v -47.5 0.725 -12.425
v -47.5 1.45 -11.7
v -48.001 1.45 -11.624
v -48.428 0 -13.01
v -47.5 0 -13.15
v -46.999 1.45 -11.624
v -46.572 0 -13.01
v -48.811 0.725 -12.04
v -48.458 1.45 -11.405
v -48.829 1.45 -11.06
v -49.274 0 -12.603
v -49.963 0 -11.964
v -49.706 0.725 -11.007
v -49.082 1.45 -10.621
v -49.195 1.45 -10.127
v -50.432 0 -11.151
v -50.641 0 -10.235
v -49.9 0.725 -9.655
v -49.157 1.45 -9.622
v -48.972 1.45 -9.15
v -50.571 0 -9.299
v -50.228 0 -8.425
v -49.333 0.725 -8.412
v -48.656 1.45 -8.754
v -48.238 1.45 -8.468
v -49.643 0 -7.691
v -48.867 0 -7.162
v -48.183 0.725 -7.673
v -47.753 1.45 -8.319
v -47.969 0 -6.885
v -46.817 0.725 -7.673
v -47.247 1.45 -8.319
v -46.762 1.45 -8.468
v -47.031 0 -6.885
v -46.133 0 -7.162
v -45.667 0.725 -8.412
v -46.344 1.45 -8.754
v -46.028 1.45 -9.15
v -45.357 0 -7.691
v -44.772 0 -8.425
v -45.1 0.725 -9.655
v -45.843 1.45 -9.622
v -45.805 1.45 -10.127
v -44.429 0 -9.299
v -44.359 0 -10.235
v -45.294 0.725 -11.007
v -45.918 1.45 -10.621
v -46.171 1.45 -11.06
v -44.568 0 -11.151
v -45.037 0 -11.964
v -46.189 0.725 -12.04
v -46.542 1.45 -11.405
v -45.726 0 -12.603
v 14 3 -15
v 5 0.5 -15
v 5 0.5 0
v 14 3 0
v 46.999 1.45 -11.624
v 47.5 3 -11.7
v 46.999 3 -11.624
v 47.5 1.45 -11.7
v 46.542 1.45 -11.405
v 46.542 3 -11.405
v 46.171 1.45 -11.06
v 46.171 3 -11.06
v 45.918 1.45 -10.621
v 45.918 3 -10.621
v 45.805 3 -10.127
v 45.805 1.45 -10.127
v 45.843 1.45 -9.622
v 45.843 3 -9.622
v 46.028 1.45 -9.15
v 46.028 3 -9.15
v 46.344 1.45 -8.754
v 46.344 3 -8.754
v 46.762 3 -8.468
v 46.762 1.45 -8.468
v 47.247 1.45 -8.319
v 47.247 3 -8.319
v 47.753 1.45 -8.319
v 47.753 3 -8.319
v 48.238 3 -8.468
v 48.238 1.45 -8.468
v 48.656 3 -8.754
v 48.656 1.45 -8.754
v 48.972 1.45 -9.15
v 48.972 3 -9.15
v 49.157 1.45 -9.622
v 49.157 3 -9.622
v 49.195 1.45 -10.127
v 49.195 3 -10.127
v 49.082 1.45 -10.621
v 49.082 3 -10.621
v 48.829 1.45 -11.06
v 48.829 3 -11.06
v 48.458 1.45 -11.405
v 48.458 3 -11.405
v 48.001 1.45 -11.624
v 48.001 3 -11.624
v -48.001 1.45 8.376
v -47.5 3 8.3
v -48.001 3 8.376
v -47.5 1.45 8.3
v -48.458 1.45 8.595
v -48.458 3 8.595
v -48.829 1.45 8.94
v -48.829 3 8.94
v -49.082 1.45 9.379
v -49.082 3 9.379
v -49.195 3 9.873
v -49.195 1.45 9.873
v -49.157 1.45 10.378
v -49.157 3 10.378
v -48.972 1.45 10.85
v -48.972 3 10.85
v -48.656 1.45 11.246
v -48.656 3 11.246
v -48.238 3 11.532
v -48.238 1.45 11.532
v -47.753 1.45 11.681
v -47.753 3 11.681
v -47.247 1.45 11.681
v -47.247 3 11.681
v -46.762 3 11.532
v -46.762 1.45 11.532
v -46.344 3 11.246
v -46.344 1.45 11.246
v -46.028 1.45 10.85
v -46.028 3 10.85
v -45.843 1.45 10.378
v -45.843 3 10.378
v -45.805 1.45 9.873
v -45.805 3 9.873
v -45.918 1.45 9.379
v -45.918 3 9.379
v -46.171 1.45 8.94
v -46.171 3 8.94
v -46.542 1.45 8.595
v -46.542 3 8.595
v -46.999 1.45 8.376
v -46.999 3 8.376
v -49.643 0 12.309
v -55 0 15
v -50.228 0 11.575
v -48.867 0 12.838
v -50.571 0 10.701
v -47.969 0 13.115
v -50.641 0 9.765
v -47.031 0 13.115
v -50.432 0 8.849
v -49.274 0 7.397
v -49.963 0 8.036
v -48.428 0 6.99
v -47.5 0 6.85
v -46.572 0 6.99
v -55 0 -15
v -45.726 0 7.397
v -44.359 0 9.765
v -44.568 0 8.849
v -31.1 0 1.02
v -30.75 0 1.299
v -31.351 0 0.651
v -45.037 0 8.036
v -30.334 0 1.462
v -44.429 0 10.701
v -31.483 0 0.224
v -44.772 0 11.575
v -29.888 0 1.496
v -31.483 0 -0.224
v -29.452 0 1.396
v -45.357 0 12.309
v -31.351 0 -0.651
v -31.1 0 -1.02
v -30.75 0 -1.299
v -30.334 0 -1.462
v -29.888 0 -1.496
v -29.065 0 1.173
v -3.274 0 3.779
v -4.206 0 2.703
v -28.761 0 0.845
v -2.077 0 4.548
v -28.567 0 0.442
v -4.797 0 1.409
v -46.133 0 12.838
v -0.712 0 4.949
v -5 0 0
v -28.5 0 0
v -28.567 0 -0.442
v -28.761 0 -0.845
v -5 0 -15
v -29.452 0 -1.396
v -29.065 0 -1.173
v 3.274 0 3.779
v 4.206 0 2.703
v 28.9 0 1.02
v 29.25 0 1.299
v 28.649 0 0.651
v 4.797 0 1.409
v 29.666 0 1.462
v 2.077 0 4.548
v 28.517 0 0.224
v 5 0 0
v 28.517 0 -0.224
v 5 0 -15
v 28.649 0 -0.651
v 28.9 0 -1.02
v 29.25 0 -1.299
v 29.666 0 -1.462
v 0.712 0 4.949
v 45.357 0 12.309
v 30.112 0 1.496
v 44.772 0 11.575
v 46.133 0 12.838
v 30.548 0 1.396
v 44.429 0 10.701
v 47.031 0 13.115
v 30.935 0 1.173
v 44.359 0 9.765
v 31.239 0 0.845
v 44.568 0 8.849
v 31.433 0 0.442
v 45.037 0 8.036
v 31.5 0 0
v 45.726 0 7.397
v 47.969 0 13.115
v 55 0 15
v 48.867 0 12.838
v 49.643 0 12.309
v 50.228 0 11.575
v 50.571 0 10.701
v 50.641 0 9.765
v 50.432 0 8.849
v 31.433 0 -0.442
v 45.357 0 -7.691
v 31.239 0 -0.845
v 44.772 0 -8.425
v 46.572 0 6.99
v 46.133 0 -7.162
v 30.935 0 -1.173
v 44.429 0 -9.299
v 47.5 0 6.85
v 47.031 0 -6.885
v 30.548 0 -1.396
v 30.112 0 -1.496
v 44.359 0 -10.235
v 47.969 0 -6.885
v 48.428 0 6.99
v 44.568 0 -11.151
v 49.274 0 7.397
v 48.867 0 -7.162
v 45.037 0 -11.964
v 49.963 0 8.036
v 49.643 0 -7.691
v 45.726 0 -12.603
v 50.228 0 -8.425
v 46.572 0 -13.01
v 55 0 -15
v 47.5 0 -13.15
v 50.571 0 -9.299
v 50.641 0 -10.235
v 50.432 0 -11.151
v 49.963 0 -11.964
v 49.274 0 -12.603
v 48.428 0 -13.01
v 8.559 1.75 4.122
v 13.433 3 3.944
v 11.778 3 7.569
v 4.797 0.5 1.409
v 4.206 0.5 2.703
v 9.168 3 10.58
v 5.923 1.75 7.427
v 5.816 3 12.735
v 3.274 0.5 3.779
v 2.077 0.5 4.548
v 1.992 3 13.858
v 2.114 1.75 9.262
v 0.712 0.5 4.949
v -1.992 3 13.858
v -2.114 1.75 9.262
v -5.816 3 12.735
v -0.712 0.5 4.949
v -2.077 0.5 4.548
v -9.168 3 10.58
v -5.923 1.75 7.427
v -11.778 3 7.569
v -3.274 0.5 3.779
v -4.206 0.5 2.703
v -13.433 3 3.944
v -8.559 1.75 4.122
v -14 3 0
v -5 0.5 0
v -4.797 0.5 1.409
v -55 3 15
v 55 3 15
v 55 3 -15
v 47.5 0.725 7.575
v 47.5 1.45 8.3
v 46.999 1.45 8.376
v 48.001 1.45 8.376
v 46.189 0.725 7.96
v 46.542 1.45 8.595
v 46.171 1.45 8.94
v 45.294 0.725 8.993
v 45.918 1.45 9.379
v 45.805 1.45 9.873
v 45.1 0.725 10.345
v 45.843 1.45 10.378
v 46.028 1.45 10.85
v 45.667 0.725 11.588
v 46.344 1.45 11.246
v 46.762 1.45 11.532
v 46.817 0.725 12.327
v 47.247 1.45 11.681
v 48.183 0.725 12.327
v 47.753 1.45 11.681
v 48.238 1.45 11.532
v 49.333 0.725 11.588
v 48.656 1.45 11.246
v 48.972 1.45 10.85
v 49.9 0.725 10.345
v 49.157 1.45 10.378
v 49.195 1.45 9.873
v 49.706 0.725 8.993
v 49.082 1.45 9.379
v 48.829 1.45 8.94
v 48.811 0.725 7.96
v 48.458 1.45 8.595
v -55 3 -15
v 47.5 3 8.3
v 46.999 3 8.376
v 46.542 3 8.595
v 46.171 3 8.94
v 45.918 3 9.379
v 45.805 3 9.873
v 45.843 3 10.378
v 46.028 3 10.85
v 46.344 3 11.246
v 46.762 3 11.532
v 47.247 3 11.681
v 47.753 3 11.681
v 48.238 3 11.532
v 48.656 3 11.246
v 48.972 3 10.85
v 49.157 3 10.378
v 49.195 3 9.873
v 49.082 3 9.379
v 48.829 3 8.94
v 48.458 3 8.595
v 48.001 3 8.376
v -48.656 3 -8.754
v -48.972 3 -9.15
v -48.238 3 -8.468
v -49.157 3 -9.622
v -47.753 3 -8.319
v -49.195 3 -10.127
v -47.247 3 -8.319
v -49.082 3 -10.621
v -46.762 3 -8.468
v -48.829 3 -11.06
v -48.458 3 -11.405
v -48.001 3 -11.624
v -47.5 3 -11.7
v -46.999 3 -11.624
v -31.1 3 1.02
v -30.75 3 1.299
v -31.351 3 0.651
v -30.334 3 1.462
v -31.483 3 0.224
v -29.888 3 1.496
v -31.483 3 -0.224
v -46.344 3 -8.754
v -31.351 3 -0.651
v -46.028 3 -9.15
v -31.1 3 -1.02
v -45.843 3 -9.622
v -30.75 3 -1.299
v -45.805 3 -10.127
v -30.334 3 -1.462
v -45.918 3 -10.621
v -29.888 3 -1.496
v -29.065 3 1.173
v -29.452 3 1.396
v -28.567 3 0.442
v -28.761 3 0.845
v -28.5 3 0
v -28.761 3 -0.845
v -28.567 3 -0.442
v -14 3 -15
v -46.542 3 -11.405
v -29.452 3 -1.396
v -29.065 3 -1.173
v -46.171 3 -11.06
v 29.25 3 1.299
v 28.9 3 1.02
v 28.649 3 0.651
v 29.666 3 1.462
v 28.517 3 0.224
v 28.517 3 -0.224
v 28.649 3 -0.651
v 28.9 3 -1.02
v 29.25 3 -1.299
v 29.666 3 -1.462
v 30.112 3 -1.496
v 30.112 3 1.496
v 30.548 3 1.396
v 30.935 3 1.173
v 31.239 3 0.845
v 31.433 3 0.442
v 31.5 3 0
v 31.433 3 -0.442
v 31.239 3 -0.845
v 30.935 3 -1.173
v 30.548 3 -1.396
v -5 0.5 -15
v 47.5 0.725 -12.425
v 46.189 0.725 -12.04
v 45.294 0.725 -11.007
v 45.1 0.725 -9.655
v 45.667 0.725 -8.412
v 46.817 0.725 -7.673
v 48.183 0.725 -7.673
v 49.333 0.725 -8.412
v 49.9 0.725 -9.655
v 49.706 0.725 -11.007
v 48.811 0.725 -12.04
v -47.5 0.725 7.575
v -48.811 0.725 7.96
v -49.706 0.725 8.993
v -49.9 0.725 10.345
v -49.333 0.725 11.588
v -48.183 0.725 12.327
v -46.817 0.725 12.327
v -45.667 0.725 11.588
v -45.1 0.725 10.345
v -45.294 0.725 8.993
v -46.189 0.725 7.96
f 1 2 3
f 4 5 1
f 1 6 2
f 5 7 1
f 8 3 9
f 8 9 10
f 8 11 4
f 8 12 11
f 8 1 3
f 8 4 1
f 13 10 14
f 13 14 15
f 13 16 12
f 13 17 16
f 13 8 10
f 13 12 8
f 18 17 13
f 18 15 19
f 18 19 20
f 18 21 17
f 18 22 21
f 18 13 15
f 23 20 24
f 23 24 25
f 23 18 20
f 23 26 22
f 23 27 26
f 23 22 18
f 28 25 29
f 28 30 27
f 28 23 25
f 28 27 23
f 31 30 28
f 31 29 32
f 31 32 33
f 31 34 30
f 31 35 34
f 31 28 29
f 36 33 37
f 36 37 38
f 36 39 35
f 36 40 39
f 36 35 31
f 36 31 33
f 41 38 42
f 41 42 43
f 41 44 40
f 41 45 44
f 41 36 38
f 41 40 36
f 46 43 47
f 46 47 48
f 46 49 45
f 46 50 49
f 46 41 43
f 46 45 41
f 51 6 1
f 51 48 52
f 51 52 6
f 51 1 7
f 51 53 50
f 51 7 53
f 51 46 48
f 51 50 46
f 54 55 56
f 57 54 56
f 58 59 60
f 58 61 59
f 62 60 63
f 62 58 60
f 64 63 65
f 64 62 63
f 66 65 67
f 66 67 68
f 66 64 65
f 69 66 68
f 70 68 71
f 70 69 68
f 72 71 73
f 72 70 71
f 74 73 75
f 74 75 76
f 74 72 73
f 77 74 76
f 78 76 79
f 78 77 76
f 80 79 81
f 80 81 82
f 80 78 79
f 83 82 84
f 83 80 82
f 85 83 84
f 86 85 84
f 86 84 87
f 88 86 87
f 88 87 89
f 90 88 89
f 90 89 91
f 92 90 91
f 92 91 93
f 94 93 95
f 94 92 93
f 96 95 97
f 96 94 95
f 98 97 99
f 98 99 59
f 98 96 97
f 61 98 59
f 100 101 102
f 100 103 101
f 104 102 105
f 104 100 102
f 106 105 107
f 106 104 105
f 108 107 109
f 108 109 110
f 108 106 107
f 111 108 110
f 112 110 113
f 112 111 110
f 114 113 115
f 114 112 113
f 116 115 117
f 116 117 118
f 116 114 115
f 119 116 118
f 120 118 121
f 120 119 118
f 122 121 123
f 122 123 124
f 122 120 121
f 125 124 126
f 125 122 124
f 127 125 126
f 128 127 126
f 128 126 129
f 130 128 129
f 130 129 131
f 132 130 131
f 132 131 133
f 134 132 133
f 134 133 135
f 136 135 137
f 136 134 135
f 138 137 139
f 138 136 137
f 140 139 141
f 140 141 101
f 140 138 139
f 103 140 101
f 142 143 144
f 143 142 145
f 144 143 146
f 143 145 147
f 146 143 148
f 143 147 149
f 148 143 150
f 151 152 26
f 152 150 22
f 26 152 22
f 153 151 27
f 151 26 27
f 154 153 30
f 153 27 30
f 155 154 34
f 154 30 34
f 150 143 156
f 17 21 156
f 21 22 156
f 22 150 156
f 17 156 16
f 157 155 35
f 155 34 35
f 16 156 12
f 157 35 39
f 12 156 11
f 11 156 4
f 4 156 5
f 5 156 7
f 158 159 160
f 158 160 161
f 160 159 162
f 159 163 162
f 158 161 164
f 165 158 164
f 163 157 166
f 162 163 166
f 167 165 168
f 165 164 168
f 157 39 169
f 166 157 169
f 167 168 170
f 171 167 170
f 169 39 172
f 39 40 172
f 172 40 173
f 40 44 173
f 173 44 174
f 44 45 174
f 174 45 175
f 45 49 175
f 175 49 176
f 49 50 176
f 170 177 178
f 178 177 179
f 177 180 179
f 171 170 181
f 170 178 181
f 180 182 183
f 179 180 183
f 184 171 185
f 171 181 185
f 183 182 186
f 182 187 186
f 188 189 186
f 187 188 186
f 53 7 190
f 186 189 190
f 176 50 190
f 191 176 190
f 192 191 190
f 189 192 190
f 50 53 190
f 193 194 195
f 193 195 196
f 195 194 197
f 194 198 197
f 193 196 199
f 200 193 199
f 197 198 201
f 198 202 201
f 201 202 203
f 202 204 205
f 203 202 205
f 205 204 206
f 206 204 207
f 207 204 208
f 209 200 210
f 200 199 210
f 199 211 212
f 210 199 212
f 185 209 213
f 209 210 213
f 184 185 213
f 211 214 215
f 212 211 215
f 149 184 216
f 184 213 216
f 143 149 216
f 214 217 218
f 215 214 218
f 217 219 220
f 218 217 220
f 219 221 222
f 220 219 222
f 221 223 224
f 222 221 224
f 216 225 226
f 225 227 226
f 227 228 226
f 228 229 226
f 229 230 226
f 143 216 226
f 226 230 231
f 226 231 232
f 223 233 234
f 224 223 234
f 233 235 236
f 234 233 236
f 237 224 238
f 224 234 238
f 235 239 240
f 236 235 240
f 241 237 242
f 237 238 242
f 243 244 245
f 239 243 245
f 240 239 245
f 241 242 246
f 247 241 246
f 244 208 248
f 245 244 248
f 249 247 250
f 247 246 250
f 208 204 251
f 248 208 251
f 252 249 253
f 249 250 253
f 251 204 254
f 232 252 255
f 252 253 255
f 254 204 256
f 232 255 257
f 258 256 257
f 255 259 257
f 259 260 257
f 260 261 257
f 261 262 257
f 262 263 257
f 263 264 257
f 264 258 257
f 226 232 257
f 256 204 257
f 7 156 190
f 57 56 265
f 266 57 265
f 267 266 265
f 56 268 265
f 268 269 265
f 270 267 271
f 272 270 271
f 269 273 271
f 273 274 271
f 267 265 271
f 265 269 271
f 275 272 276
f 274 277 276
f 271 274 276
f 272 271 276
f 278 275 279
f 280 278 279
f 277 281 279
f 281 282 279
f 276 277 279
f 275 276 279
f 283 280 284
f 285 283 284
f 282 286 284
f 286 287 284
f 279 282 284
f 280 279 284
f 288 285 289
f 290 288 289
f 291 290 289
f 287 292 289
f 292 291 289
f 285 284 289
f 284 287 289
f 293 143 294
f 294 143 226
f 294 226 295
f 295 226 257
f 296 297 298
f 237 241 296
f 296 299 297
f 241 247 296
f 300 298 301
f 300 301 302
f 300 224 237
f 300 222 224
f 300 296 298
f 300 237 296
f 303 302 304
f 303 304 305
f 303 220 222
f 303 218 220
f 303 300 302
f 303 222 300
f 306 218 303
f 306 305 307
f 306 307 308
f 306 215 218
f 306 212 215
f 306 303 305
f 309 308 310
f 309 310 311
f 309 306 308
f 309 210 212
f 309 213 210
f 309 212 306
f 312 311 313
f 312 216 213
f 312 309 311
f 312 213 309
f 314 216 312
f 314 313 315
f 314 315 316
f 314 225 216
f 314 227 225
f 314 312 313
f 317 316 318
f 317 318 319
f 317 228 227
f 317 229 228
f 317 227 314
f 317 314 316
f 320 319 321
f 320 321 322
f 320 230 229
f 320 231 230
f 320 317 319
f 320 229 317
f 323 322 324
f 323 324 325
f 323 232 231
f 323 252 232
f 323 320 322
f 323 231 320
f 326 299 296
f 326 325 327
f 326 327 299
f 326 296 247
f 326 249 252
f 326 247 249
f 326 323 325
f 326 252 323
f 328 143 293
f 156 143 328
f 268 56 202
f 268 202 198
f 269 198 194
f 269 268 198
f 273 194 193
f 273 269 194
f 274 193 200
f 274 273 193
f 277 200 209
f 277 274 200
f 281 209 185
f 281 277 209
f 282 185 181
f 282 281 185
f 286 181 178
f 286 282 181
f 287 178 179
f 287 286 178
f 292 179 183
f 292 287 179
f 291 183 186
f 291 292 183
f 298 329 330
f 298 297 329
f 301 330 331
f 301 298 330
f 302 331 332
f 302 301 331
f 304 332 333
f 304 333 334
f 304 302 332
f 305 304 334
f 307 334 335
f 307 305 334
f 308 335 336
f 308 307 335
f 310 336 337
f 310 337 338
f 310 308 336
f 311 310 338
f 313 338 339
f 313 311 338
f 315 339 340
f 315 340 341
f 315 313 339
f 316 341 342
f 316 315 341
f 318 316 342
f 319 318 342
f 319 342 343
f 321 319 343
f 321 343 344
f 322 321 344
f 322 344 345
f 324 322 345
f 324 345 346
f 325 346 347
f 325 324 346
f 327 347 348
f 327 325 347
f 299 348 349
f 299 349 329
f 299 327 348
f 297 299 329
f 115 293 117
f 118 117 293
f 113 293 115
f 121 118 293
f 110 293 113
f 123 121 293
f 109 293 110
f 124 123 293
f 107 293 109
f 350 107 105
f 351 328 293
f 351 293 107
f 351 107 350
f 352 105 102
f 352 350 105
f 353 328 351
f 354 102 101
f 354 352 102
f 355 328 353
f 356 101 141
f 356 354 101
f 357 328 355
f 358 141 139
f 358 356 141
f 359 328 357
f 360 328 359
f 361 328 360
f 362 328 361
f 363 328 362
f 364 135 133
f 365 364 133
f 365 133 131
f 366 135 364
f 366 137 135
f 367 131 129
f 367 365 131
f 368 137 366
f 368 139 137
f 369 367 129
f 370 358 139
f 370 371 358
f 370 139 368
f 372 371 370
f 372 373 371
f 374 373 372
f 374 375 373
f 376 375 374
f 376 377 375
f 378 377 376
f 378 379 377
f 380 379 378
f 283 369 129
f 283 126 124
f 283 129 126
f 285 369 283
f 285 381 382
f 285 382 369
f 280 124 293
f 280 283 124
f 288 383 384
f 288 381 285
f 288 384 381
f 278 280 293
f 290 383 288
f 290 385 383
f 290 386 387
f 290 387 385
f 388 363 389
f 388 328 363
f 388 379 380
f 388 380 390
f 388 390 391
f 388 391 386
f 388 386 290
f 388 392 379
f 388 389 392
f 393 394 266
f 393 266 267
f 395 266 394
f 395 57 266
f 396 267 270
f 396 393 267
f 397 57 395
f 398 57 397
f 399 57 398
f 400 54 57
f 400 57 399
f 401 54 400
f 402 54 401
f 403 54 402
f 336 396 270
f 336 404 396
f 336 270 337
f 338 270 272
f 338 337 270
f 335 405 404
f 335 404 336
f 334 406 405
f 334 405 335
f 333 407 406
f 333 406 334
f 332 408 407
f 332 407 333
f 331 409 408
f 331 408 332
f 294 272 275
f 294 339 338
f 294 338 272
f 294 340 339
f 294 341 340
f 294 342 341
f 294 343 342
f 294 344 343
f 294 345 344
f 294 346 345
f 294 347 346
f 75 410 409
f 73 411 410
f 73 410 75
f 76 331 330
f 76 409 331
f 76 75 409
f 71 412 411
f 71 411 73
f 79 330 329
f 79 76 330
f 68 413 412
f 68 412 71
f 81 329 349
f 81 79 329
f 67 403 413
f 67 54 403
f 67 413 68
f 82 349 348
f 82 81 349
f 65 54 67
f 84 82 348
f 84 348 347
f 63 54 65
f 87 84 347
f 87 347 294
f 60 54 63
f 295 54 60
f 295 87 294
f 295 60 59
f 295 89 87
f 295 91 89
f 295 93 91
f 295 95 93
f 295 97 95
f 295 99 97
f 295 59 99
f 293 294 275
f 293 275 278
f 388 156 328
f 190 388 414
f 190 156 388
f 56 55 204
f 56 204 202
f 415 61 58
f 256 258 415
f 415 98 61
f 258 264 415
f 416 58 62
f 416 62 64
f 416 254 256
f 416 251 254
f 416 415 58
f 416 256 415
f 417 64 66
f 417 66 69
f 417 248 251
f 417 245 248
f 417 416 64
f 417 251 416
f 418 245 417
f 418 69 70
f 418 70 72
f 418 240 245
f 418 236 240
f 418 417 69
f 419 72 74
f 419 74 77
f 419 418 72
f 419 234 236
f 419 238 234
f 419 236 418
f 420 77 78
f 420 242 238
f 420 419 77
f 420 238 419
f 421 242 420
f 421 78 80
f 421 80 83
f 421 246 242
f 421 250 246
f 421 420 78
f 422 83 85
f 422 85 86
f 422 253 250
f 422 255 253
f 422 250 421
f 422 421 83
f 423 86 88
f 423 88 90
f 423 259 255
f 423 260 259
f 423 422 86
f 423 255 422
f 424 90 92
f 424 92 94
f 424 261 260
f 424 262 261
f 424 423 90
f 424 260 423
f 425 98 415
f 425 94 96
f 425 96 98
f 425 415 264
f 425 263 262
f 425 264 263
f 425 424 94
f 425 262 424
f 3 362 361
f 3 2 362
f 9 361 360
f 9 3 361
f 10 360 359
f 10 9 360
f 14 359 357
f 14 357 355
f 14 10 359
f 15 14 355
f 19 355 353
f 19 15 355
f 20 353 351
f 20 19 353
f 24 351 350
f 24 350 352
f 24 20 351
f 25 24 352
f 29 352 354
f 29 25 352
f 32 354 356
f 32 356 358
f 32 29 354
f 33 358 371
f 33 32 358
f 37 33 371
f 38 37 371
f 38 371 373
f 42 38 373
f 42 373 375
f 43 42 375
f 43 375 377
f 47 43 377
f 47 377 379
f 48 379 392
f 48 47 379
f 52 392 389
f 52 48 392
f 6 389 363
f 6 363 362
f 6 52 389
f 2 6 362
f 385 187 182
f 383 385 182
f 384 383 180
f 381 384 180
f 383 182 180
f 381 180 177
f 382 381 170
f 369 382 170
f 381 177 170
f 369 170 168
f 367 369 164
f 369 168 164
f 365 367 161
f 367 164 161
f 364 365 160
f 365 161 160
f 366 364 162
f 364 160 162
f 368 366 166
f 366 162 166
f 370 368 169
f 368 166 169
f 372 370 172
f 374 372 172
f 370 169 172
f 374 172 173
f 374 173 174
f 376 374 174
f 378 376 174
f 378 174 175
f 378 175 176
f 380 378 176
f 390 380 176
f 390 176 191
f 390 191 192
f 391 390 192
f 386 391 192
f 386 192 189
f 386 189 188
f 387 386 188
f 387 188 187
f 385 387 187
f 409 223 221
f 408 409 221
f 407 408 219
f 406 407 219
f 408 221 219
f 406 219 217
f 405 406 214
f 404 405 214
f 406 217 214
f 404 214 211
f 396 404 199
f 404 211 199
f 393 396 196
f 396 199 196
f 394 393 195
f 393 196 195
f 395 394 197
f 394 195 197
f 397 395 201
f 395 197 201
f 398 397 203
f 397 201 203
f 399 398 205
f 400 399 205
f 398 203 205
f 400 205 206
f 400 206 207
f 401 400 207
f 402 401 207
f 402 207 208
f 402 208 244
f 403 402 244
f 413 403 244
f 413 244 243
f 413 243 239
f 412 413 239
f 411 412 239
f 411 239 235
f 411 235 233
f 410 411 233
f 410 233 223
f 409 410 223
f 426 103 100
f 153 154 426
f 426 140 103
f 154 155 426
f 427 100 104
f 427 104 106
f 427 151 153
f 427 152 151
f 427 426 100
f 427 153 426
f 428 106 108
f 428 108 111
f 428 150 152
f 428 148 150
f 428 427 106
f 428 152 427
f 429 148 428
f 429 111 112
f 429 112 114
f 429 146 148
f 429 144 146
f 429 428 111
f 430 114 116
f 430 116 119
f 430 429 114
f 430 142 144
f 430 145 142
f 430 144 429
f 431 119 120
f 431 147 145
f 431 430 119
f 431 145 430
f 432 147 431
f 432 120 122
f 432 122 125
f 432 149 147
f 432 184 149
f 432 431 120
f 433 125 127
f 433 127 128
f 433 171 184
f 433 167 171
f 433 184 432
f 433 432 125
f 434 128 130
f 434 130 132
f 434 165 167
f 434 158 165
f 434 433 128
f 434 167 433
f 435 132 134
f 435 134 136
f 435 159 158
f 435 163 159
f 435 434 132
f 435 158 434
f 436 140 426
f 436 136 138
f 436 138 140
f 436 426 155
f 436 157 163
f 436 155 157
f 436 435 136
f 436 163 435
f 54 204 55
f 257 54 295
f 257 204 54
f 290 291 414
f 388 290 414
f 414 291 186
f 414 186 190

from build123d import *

# Parameters (mm, degrees)
SKETCH1_W                                    = 110
SKETCH1_H                                    = 30
EXTRUDE1_DEPTH                               = 3
CUT_EXTRUDE1_DEPTH                           = 58.087651905
CHAMFER1_SIZE                                = 9
CHAMFER1_SIZE2                               = 2.5
CSK_FOR_M3_COUNTERSUNK_RAISED_HEAD_S_2_COUNT = 2
CSK_FOR_M3_COUNTERSUNK_RAISED_HEAD_S_2_PITCH = 95
CSK_FOR_M3_COUNTERSUNK_RAISED_HEAD_S_3_COUNT = 2
CSK_FOR_M3_COUNTERSUNK_RAISED_HEAD_S_3_PITCH = 97.082439195
CSK_FOR_M3_COUNTERSUNK_RAISED_HEAD_S_4_COUNT = 2
CSK_FOR_M3_COUNTERSUNK_RAISED_HEAD_S_4_PITCH = 20
M3_TAPPED_HOLE1_D                            = 3


with BuildPart() as part:
    # Sketch1 → Extrude1 (new body)
    with BuildSketch(Plane(origin=(0, 0, 0), x_dir=(1, 0, 0), z_dir=(0, 1, 0))):
        Rectangle(SKETCH1_W, SKETCH1_H)
    extrude(amount=EXTRUDE1_DEPTH)

    # Sketch2 → Cut-Extrude1 (cut, through all)
    with BuildSketch(Plane(origin=(0, 3, 0), x_dir=(-1, 0, 0), z_dir=(0, 1, 0))):
        with BuildLine():
            Line((5, 0), (5, -15))
            Line((5, -15), (-5, -15))
            Line((-5, -15), (-5, 0))
            ThreePointArc((-5, 0), (0, 5), (5, 0))
        make_face()
    extrude(amount=-CUT_EXTRUDE1_DEPTH, mode=Mode.SUBTRACT)

    # Chamfer1
    chamfer1_edges = [part.edges().sort_by_distance(p)[0] for p in [
        (0, 3, 5),
        (5, 3, -7.5),
        (-5, 3, -7.5),
    ]]
    chamfer1_side = [part.faces().sort_by_distance(p)[0] for p in [
        (-53.859824575, 3, 0),
    ]]
    chamfer(chamfer1_edges, length=CHAMFER1_SIZE, length2=CHAMFER1_SIZE2, reference=chamfer1_side[0])

    # Sketch8 → CSK for M3 Countersunk Raised Head Screw1 (revolve, cut)
    with BuildSketch(Plane(origin=(47.5, 0, -10), x_dir=(0, 0, -1), z_dir=(1, 0, 0))):
        Polygon((0, 0), (0, 3), (1.7, 3), (1.7, 1.45), (3.15, 0), align=None)
    csk_for_m3_countersunk_raised_head_screw = revolve(axis=Axis((47.5, -6.35, -10), (0, 1, 0)), mode=Mode.SUBTRACT)

    # CSK for M3 Countersunk Raised Head S 2: CSK for M3 Countersunk Raised Head Screw1 ×2
    with Locations(*[(-i * CSK_FOR_M3_COUNTERSUNK_RAISED_HEAD_S_2_PITCH, 0, 0) for i in range(1, CSK_FOR_M3_COUNTERSUNK_RAISED_HEAD_S_2_COUNT)]):
        add(csk_for_m3_countersunk_raised_head_screw, mode=Mode.SUBTRACT)

    # CSK for M3 Countersunk Raised Head S 3: CSK for M3 Countersunk Raised Head Screw1 ×2
    with Locations(*[Vector(-0.978549784986749, 0, 0.20601048104984188) * (i * CSK_FOR_M3_COUNTERSUNK_RAISED_HEAD_S_3_PITCH) for i in range(1, CSK_FOR_M3_COUNTERSUNK_RAISED_HEAD_S_3_COUNT)]):
        add(csk_for_m3_countersunk_raised_head_screw, mode=Mode.SUBTRACT)

    # CSK for M3 Countersunk Raised Head S 4: CSK for M3 Countersunk Raised Head Screw1 ×2
    with Locations(*[(0, 0, i * CSK_FOR_M3_COUNTERSUNK_RAISED_HEAD_S_4_PITCH) for i in range(1, CSK_FOR_M3_COUNTERSUNK_RAISED_HEAD_S_4_COUNT)]):
        add(csk_for_m3_countersunk_raised_head_screw, mode=Mode.SUBTRACT)

    # M3 Tapped Hole1 (through all)
    with Locations(Plane(origin=(0, 3, 0), x_dir=(-1, 0, 0), z_dir=(0, 1, 0))):
        with Locations((-30, 0), (30, 0)):
            Hole(M3_TAPPED_HOLE1_D / 2)


solid = part.part
